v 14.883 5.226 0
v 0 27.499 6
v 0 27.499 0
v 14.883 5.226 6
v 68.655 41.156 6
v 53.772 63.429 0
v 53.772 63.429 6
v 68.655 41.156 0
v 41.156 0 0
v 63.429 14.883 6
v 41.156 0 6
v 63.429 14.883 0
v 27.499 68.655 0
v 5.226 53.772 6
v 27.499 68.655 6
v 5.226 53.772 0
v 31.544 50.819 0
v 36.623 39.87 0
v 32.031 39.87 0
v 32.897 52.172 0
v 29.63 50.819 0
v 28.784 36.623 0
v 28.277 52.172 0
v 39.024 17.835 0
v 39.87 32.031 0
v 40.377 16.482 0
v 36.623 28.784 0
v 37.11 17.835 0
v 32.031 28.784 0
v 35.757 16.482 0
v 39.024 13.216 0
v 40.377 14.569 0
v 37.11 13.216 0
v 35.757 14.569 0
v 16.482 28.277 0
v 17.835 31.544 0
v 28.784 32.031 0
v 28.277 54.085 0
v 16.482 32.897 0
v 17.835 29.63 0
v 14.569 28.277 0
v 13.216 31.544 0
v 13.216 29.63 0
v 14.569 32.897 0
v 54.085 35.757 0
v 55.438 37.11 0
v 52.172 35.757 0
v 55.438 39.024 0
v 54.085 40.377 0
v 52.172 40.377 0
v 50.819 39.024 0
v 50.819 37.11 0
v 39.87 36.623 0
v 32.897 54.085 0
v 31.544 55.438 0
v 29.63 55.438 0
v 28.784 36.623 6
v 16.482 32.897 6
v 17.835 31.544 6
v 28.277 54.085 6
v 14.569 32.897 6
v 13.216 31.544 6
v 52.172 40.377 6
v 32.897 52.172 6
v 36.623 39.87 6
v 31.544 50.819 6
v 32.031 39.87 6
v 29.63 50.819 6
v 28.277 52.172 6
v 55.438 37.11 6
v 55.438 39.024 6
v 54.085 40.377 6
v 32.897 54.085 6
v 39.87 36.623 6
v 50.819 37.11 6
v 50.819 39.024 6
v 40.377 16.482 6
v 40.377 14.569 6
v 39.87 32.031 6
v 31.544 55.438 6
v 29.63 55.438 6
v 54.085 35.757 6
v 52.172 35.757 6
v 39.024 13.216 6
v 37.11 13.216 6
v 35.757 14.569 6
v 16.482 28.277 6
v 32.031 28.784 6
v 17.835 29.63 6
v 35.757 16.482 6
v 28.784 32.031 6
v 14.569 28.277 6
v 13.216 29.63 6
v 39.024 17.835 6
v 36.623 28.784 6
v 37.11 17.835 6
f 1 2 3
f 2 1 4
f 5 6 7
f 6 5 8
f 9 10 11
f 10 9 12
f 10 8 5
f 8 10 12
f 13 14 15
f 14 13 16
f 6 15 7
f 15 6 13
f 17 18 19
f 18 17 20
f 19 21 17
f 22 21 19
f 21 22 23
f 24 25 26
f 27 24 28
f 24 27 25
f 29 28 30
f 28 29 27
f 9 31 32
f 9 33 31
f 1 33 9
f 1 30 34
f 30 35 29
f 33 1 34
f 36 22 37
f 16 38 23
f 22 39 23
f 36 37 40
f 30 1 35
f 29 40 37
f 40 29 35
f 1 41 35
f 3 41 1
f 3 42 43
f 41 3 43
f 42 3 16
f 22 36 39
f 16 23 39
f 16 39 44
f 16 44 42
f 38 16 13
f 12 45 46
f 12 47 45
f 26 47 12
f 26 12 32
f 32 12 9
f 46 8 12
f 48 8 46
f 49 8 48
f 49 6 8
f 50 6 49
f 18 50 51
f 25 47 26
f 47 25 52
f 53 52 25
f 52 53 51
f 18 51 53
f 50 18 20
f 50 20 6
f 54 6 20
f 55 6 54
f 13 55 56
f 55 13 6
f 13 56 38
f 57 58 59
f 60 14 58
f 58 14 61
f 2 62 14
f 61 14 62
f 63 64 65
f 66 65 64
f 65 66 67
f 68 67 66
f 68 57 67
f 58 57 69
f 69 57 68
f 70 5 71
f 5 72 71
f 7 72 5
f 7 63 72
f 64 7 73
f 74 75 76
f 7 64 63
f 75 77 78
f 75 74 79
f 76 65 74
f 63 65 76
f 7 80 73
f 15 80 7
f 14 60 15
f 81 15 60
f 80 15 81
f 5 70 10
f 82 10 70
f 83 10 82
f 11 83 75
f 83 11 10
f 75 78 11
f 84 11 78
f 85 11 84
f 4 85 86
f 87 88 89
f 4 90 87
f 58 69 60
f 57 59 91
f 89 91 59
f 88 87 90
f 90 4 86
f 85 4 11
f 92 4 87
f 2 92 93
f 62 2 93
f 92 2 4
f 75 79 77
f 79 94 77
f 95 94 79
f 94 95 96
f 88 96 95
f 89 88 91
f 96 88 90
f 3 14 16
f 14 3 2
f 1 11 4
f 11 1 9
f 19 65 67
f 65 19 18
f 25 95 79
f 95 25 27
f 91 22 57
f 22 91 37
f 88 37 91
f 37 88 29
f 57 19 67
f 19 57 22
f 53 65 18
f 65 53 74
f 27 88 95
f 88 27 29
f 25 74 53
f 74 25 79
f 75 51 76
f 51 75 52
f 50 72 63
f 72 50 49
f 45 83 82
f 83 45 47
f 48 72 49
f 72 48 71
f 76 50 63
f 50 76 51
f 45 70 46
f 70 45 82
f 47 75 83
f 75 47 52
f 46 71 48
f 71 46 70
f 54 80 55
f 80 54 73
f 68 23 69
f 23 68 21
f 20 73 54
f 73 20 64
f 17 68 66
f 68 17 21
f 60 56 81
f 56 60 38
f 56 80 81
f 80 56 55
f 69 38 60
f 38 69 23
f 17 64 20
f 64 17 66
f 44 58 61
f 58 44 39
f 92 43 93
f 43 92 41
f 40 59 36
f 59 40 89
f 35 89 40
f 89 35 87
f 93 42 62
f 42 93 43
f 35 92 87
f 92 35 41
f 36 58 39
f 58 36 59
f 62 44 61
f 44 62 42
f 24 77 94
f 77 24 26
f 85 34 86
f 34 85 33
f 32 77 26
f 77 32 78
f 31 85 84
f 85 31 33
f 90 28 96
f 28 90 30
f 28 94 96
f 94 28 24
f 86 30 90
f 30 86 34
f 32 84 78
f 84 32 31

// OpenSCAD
$fn = 32;

// ----------------------------------------------------------------------
// Polygon plate: 8-gon R35, 4 bolt windows
// ----------------------------------------------------------------------

// --- parameters (mm) ---
sides = 8;                // number of polygon sides
plate_r = 35;             // circumscribed radius of the polygon
bore_r = 6;               // centre bore radius
bolts = 4;                // number of bolt windows
ring_r = 19.17;           // bolt-circle radius
bolt_r = 2.5;             // bolt window radius
plate_t = 6;              // plate thickness, Z (extrusion height)

plate_d = 2 * plate_r;  // circumscribed diameter
bore_d = 2 * bore_r;  // centre bore diameter
bolt_d = 2 * bolt_r;  // bolt window diameter
ring_d = 2 * ring_r;  // bolt-circle diameter

profile = [[68.655, 41.156], [53.772, 63.429], [27.499, 68.655], [5.226, 53.772], [0, 27.499], [14.883, 5.226], [41.156, 0], [63.429, 14.883]];  // primary outline, 8 points, counter clockwise
void_1 = [[39.87, 36.623], [36.623, 39.87], [32.031, 39.87], [28.784, 36.623], [28.784, 32.031], [32.031, 28.784], [36.623, 28.784], [39.87, 32.031]];  // centre bore, 8 points
void_2 = [[55.438, 39.024], [54.085, 40.377], [52.172, 40.377], [50.819, 39.024], [50.819, 37.11], [52.172, 35.757], [54.085, 35.757], [55.438, 37.11]];  // bolt window 1, 8 points
void_3 = [[32.897, 54.085], [31.544, 55.438], [29.63, 55.438], [28.277, 54.085], [28.277, 52.172], [29.63, 50.819], [31.544, 50.819], [32.897, 52.172]];  // bolt window 2, 8 points
void_4 = [[17.835, 31.544], [16.482, 32.897], [14.569, 32.897], [13.216, 31.544], [13.216, 29.63], [14.569, 28.277], [16.482, 28.277], [17.835, 29.63]];  // bolt window 3, 8 points
void_5 = [[40.377, 16.482], [39.024, 17.835], [37.11, 17.835], [35.757, 16.482], [35.757, 14.569], [37.11, 13.216], [39.024, 13.216], [40.377, 14.569]];  // bolt window 4, 8 points

// --- the one profile operation ---
difference() {
  linear_extrude(height = plate_t) polygon(points = profile);
  translate([0, 0, -1])
    linear_extrude(height = plate_t + 2) polygon(points = void_1);
  translate([0, 0, -1])
    linear_extrude(height = plate_t + 2) polygon(points = void_2);
  translate([0, 0, -1])
    linear_extrude(height = plate_t + 2) polygon(points = void_3);
  translate([0, 0, -1])
    linear_extrude(height = plate_t + 2) polygon(points = void_4);
  translate([0, 0, -1])
    linear_extrude(height = plate_t + 2) polygon(points = void_5);
}
